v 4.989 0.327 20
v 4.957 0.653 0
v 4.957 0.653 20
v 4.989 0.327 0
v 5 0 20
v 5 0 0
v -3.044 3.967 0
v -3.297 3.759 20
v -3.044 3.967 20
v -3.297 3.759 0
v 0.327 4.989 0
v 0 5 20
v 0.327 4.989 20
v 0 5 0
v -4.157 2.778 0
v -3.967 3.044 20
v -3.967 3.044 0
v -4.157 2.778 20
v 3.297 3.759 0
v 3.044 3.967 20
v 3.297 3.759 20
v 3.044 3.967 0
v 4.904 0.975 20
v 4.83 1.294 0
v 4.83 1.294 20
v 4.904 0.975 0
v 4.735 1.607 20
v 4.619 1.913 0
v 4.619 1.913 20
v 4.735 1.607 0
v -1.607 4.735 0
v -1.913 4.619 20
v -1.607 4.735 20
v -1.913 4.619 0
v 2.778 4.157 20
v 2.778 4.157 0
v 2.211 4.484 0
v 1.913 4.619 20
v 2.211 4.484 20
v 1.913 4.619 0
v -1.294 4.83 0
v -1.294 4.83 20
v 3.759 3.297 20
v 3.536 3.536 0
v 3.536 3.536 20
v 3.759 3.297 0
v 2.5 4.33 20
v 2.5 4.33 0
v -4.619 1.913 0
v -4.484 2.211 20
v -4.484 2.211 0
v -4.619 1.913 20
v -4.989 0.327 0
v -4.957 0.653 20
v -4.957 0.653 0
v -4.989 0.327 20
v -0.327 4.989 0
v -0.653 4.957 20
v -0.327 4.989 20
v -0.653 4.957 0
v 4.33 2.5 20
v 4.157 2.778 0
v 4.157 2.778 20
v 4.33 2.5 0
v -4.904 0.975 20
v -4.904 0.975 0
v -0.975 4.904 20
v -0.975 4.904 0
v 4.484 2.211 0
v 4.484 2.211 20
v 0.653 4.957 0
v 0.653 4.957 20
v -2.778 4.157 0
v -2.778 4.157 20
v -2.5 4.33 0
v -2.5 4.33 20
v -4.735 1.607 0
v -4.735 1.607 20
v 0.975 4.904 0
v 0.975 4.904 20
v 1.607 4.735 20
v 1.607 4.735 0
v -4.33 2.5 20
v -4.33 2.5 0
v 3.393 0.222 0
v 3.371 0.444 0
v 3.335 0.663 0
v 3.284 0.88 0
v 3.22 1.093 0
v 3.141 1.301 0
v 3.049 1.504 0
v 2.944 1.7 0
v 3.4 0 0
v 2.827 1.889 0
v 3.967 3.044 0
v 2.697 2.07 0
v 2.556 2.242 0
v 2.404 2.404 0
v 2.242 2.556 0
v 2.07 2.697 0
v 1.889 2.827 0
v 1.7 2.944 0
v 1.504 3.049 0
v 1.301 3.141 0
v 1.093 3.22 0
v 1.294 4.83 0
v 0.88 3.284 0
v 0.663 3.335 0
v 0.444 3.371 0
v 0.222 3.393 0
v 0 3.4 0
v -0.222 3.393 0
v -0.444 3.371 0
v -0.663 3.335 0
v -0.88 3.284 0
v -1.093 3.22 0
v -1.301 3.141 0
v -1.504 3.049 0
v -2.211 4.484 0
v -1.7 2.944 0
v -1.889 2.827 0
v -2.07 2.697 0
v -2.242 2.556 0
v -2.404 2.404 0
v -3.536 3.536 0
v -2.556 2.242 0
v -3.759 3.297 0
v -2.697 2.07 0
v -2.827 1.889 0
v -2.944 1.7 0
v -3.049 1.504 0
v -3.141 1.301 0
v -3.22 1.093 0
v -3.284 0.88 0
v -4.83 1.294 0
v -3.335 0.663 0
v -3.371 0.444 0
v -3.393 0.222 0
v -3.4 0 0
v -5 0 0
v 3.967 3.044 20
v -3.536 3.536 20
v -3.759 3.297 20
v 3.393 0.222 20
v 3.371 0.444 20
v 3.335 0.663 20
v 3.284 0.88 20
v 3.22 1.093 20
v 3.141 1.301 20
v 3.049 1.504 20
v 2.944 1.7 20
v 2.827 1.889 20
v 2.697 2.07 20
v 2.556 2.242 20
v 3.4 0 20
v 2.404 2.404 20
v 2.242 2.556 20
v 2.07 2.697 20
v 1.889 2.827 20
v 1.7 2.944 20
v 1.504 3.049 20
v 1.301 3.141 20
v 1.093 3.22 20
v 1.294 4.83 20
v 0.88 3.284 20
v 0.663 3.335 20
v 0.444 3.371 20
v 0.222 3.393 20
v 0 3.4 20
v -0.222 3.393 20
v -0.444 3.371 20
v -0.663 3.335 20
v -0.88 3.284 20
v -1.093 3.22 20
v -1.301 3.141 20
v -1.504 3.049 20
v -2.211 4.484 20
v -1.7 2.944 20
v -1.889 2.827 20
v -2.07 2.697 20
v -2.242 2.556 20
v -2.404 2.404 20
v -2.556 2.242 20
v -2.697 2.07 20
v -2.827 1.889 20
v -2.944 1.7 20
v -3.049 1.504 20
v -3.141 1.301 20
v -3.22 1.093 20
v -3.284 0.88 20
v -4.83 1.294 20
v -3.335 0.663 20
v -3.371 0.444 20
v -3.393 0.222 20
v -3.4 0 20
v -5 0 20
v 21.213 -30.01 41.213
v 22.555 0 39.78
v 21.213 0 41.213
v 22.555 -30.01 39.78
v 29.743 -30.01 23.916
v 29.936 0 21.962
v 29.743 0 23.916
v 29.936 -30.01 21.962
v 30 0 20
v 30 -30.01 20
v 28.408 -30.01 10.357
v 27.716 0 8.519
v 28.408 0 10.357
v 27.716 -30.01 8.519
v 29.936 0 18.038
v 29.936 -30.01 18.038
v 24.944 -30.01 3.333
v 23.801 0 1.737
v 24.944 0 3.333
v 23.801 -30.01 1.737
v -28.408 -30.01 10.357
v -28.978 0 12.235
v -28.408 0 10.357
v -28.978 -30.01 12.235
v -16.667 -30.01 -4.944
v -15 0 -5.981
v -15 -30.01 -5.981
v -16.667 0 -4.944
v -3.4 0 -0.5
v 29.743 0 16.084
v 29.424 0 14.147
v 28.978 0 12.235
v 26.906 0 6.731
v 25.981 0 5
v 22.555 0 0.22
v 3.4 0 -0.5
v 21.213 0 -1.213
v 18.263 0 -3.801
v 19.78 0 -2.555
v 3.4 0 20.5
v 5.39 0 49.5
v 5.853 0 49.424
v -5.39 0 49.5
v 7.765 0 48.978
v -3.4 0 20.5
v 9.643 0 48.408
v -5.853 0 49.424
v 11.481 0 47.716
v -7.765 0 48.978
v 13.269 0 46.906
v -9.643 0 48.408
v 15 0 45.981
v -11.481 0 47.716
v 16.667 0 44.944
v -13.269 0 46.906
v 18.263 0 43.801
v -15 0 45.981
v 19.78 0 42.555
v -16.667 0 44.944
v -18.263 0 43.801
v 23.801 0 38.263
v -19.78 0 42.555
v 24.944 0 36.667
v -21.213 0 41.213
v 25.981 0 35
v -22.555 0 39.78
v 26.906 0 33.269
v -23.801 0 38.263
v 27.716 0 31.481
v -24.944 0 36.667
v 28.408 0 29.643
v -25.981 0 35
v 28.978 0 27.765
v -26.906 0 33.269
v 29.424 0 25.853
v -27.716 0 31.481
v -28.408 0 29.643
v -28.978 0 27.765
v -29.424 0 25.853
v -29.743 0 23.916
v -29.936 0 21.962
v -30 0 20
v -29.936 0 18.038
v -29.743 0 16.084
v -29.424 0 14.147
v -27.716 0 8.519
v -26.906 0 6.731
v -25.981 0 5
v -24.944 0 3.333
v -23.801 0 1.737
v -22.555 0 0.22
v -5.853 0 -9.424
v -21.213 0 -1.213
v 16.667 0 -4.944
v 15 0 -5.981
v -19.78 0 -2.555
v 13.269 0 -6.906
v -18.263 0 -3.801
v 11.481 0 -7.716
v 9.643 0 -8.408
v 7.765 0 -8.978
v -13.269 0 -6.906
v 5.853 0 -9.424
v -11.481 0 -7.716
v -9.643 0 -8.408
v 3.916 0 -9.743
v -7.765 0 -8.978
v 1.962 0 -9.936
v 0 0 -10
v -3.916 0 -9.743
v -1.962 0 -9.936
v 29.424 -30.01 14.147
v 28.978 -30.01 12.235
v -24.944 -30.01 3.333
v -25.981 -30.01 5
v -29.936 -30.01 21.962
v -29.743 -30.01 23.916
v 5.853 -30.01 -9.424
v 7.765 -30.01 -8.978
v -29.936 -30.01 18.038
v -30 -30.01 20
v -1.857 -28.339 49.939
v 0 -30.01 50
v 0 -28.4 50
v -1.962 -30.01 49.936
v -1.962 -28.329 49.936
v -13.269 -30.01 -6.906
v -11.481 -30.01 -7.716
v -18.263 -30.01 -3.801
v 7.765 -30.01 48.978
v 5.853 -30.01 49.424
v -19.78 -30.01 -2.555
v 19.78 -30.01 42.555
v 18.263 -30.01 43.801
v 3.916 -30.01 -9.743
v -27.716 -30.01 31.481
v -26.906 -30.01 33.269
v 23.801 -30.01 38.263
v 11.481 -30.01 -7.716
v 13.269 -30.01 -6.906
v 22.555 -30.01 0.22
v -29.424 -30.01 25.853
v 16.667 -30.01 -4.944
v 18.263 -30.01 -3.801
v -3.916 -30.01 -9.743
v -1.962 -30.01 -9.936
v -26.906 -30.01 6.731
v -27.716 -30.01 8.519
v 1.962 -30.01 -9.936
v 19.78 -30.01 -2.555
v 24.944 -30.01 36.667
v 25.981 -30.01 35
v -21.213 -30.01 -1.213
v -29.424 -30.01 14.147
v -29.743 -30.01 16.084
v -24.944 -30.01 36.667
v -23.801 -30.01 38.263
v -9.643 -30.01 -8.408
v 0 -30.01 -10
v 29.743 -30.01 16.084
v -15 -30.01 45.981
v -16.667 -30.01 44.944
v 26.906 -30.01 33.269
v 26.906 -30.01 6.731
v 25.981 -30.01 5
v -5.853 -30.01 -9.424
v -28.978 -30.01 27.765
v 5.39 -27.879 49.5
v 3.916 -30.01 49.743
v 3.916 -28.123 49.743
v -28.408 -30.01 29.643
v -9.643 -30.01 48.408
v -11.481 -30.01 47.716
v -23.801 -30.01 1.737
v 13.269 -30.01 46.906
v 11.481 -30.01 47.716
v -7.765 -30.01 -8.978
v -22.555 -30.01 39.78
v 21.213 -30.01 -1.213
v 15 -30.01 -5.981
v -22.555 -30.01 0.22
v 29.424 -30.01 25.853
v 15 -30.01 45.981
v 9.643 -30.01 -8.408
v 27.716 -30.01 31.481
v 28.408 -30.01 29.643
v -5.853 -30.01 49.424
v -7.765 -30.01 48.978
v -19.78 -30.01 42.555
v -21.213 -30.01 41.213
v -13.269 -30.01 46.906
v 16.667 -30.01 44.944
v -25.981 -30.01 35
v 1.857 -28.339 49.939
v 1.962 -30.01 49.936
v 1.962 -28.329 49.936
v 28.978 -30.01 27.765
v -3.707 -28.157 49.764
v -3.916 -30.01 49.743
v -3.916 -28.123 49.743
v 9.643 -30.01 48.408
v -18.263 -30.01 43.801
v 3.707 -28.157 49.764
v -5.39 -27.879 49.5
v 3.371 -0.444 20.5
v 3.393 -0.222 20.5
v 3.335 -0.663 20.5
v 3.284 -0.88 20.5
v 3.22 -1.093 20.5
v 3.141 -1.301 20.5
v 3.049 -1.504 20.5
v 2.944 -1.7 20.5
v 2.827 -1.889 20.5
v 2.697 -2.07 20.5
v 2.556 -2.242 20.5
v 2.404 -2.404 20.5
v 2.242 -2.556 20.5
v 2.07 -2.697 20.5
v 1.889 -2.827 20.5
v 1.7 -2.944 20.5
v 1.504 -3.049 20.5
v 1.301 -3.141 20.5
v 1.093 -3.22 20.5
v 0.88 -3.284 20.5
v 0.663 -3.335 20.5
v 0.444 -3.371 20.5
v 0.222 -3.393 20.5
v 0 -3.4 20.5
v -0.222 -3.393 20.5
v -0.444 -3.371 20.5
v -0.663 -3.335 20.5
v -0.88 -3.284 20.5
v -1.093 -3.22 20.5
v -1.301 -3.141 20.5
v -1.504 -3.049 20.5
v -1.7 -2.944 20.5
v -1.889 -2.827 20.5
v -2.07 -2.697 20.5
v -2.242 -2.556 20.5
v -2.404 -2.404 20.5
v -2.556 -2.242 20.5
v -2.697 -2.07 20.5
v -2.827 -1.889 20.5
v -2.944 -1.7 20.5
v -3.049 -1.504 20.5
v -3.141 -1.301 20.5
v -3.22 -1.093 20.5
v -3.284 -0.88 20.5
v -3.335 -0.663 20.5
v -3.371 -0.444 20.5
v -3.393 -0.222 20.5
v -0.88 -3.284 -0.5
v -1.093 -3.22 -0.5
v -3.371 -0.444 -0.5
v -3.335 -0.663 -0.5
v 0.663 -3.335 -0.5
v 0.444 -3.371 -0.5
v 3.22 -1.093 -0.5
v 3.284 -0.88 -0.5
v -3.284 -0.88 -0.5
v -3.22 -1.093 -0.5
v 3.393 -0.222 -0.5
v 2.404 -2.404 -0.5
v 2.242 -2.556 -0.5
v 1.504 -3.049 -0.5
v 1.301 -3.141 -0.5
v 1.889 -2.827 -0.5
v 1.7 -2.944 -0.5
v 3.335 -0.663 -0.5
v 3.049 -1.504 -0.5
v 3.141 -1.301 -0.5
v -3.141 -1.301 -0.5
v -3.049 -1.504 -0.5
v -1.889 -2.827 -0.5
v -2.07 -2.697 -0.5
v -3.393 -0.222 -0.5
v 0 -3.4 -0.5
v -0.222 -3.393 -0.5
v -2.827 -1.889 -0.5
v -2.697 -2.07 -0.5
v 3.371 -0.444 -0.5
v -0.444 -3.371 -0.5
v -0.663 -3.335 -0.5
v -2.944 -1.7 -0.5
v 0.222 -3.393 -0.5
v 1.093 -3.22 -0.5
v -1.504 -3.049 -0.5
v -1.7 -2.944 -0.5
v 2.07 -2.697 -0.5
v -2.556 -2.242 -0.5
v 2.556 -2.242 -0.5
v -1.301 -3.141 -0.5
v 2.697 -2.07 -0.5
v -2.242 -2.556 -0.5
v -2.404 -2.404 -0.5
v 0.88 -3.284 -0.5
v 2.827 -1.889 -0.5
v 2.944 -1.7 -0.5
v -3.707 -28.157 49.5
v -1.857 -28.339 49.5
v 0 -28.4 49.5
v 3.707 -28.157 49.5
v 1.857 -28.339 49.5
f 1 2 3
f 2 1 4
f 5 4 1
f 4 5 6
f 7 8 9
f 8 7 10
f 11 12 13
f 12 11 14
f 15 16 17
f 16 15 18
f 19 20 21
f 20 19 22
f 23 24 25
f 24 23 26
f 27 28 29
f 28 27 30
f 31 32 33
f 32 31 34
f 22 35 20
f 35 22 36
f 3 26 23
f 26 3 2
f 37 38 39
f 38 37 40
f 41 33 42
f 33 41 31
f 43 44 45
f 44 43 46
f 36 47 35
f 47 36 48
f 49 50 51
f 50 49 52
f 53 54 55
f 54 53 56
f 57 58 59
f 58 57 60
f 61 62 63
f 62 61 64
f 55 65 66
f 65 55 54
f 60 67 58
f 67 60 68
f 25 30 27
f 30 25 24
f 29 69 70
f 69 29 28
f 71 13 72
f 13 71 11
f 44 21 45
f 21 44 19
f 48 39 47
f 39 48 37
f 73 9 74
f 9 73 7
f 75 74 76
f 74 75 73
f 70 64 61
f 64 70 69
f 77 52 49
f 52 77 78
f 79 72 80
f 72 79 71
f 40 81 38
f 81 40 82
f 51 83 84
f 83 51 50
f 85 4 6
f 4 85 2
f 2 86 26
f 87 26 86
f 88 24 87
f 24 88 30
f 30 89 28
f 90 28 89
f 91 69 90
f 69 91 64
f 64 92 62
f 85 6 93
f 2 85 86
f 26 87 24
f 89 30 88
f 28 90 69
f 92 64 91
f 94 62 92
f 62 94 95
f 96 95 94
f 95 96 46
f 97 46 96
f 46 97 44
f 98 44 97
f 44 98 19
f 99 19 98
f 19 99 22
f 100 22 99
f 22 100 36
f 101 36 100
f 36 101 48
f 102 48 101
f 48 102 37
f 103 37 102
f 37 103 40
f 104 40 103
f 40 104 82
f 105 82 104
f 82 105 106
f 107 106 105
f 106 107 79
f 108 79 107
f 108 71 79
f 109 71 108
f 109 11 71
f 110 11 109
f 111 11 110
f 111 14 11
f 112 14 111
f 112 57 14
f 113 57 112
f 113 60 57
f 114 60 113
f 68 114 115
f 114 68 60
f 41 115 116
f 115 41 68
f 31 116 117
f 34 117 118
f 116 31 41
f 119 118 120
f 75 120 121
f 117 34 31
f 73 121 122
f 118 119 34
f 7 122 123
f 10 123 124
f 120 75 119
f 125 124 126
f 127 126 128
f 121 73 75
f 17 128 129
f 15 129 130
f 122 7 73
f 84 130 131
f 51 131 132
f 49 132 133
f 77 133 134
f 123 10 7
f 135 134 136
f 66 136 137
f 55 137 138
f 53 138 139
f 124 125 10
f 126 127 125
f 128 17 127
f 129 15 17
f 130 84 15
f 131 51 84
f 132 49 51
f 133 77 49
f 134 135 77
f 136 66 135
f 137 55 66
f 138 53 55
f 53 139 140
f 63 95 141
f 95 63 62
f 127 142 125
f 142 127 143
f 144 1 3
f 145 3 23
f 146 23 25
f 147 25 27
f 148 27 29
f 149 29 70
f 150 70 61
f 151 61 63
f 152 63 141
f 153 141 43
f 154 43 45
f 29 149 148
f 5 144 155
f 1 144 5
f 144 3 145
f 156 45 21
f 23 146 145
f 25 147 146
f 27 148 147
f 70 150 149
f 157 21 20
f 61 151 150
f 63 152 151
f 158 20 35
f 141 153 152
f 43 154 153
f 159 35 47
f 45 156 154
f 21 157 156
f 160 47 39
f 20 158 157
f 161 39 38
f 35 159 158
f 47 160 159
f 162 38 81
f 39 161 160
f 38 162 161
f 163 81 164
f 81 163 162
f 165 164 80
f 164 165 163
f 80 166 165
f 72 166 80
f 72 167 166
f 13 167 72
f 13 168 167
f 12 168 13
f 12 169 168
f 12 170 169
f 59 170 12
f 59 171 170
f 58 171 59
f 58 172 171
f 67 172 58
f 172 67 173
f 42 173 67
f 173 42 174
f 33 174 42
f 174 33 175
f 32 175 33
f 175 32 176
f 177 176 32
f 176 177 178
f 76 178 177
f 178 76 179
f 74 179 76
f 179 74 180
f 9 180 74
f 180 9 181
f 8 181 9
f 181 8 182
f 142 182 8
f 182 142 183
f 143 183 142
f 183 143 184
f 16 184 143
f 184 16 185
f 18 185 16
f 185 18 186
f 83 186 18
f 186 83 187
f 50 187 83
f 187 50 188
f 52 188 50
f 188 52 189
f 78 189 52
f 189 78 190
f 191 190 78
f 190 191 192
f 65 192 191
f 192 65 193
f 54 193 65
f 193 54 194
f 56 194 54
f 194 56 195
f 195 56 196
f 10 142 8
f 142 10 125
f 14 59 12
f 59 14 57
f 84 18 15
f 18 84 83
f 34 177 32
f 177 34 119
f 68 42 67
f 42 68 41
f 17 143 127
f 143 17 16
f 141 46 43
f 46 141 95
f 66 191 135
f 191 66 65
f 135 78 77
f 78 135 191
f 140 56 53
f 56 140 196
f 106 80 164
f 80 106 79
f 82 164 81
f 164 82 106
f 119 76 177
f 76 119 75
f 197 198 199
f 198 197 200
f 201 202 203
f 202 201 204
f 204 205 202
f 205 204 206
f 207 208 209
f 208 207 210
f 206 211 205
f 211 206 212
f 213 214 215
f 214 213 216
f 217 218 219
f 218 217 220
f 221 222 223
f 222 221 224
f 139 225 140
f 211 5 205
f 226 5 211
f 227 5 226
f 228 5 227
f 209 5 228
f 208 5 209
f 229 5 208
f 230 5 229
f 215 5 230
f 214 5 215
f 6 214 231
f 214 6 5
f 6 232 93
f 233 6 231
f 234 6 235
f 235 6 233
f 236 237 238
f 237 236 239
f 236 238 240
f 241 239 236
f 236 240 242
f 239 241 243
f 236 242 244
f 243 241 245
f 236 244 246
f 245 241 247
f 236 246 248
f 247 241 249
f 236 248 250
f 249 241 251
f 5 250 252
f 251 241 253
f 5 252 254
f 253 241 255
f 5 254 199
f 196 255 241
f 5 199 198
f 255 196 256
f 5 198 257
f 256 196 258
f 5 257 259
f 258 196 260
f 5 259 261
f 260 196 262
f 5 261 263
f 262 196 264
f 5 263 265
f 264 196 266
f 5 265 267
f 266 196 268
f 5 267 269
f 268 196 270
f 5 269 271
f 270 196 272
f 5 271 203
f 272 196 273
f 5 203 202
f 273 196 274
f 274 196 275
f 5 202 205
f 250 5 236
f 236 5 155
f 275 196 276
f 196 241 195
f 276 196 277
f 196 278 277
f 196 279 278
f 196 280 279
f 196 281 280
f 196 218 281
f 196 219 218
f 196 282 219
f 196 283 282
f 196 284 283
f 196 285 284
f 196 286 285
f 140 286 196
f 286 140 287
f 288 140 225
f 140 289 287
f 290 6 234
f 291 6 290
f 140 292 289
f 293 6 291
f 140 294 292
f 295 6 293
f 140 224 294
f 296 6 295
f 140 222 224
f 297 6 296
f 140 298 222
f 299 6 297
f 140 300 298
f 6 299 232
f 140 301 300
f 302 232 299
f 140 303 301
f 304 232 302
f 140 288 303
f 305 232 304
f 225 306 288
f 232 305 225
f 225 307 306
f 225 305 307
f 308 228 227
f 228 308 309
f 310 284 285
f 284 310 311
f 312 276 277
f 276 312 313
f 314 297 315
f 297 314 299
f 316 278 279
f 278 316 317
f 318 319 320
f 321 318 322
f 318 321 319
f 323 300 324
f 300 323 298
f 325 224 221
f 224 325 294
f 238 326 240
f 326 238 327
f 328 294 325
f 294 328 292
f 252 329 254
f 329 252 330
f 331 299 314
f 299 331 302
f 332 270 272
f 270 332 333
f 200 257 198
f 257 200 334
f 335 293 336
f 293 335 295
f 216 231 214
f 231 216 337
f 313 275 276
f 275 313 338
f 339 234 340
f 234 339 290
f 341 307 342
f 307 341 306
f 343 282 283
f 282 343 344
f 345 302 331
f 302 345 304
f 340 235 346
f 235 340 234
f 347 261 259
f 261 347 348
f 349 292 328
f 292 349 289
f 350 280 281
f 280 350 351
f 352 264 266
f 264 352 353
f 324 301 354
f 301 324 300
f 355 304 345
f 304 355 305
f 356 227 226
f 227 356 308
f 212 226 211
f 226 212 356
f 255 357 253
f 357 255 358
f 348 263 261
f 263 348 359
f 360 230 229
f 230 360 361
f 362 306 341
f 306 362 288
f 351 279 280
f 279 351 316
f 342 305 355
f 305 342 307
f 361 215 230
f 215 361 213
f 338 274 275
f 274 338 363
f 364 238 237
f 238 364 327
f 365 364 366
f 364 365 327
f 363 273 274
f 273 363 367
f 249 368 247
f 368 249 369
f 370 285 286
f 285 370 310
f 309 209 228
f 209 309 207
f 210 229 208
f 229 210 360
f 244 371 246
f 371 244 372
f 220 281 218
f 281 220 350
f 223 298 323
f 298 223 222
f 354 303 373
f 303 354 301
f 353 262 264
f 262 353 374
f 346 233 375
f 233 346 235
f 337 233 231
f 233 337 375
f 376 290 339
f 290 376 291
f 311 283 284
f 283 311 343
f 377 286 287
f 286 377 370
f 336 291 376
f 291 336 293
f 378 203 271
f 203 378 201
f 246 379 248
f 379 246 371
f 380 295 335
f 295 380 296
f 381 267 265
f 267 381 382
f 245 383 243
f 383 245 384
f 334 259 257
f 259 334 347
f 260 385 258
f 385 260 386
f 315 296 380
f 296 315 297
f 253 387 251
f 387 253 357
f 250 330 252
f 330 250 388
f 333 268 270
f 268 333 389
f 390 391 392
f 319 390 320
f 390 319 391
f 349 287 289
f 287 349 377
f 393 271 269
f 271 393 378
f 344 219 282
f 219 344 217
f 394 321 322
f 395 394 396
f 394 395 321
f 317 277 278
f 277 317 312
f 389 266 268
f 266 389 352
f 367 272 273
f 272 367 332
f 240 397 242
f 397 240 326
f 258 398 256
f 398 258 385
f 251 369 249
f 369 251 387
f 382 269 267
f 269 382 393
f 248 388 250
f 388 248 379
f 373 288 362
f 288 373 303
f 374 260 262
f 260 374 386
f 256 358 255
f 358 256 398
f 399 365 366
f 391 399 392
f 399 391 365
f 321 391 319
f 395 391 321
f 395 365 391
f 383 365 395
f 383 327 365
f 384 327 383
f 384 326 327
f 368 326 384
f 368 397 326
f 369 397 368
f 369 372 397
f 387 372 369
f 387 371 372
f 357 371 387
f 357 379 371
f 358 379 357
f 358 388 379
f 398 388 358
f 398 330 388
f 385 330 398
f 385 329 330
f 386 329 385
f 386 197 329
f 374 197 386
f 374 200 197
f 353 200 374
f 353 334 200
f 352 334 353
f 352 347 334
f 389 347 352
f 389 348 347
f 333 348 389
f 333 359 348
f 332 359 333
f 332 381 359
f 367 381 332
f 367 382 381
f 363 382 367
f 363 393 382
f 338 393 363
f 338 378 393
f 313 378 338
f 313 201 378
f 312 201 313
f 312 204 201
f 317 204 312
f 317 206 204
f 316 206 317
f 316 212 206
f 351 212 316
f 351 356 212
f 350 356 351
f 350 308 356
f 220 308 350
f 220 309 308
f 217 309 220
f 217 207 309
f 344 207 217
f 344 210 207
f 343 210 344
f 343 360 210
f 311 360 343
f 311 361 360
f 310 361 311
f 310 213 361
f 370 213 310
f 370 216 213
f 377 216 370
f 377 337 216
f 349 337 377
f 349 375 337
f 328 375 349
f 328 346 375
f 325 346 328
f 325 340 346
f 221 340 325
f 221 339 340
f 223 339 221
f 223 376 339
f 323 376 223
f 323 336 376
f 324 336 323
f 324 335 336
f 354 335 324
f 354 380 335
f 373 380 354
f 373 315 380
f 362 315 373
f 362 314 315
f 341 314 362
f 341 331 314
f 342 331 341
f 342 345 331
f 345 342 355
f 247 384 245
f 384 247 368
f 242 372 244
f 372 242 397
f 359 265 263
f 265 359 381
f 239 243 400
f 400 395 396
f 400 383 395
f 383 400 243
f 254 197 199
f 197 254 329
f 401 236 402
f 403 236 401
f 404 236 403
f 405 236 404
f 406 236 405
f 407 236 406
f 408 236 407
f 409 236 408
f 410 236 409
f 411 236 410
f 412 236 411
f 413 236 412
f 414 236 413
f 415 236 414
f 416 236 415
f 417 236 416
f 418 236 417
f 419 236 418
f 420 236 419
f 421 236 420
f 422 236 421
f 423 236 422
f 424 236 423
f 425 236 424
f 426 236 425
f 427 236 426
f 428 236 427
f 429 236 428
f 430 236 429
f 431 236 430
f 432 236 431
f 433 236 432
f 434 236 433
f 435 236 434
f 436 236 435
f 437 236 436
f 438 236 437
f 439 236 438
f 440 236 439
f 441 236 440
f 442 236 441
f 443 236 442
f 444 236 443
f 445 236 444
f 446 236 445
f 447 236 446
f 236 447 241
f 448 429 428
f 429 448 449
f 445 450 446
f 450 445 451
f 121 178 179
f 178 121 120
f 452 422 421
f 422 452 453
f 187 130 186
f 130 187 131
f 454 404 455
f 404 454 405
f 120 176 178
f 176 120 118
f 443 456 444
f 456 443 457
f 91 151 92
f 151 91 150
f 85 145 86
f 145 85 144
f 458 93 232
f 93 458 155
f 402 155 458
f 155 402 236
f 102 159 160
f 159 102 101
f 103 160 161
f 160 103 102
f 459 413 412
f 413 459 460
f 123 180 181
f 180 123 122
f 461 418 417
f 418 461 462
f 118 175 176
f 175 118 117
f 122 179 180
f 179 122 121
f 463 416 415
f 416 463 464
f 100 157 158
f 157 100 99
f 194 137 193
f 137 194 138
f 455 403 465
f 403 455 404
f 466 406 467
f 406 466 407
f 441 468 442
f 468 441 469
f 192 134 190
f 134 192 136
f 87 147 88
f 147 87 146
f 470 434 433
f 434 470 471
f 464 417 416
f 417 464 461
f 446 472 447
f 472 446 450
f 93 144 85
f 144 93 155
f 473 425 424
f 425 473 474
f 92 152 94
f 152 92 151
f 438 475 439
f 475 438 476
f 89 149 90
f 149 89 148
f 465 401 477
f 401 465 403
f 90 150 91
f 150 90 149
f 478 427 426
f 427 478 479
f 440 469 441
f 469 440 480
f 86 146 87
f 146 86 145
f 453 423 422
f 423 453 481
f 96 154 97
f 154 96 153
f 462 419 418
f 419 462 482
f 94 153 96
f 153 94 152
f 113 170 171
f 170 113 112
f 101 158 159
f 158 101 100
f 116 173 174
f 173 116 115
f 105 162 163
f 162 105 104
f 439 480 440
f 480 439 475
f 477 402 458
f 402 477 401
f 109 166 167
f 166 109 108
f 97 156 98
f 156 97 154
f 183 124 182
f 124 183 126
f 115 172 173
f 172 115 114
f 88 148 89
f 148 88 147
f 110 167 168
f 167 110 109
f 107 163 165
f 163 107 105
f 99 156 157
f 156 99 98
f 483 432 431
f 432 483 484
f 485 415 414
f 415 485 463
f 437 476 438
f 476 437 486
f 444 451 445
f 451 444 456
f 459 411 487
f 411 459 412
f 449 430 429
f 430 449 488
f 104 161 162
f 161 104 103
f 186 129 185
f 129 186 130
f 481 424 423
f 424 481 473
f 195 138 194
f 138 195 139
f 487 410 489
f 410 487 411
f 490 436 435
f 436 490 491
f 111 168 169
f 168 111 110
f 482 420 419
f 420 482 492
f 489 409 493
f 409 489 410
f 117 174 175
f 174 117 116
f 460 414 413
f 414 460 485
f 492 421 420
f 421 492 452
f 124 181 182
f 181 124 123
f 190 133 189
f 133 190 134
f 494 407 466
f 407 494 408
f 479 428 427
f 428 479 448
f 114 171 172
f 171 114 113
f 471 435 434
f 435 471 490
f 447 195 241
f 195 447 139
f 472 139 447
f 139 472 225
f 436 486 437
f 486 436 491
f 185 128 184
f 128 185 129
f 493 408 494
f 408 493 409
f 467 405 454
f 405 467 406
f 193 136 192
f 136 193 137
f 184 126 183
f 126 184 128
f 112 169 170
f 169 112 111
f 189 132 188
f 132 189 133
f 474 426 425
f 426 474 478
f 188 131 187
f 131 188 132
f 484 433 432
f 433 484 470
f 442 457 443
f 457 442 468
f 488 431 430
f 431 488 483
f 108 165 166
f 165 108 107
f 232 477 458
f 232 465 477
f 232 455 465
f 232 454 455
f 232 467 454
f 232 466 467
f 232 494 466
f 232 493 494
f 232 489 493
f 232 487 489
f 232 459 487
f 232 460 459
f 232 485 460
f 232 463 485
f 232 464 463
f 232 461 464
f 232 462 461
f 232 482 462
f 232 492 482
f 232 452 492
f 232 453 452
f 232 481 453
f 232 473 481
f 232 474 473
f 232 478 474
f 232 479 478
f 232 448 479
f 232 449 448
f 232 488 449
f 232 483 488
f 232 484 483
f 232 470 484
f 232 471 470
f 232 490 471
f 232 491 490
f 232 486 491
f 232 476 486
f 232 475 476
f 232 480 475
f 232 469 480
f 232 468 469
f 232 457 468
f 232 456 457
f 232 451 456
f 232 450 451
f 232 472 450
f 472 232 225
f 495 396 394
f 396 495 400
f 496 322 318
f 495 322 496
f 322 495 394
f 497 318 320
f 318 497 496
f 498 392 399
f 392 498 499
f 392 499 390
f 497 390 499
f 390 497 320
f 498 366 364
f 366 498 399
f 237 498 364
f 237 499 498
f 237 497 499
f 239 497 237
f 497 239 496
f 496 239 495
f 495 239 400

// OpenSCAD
// Lab funnel - printed upright, open top and bottom
// Units: mm. One complete part, no external libraries.

// ---- Parameters ----
spout_od      = 10;    // spout outer diameter
spout_length  = 20;    // spout runs from z = 0 to z = 20
cone_top_d    = 10;    // cone outer diameter at z = 20 (spout/cone overlap)
cone_rim_d    = 60;    // cone rim outer diameter at z = 50
wall          = 1.6;   // uniform wall thickness
eps           = 0.5;   // cutter overshoot past faces

$fn = 96;              // smoothness of curved shapes

// ---- Derived ----
spout_id = spout_od - 2 * wall;   // spout bore (6.8 mm)
cone_h   = 50 - 20;               // cone height (30 mm)

// ---- Model ----
difference() {
    union() {
        // Spout: straight tube from z = 0 to z = 20
        cylinder(d = spout_od, h = spout_length);

        // Cone: widens from 10 mm at z = 20 to 60 mm at z = 50
        translate([0, 0, spout_length])
            rotate([90, 0, 0])
                linear_extrude(height = cone_h + 0.01)
                    circle(d = cone_rim_d);
    }

    // ---- Openings (through the whole part) ----
    // 1. Bottom of spout
    translate([0, 0, -eps])
        cylinder(d = spout_id, h = spout_length + 2 * eps);

    // 2. Top rim: cut the 1.6 mm wall around the 60 mm opening
    translate([0, 0, 50 - eps])
        cylinder(d = cone_rim_d - 2 * wall, h = wall + eps);
}
